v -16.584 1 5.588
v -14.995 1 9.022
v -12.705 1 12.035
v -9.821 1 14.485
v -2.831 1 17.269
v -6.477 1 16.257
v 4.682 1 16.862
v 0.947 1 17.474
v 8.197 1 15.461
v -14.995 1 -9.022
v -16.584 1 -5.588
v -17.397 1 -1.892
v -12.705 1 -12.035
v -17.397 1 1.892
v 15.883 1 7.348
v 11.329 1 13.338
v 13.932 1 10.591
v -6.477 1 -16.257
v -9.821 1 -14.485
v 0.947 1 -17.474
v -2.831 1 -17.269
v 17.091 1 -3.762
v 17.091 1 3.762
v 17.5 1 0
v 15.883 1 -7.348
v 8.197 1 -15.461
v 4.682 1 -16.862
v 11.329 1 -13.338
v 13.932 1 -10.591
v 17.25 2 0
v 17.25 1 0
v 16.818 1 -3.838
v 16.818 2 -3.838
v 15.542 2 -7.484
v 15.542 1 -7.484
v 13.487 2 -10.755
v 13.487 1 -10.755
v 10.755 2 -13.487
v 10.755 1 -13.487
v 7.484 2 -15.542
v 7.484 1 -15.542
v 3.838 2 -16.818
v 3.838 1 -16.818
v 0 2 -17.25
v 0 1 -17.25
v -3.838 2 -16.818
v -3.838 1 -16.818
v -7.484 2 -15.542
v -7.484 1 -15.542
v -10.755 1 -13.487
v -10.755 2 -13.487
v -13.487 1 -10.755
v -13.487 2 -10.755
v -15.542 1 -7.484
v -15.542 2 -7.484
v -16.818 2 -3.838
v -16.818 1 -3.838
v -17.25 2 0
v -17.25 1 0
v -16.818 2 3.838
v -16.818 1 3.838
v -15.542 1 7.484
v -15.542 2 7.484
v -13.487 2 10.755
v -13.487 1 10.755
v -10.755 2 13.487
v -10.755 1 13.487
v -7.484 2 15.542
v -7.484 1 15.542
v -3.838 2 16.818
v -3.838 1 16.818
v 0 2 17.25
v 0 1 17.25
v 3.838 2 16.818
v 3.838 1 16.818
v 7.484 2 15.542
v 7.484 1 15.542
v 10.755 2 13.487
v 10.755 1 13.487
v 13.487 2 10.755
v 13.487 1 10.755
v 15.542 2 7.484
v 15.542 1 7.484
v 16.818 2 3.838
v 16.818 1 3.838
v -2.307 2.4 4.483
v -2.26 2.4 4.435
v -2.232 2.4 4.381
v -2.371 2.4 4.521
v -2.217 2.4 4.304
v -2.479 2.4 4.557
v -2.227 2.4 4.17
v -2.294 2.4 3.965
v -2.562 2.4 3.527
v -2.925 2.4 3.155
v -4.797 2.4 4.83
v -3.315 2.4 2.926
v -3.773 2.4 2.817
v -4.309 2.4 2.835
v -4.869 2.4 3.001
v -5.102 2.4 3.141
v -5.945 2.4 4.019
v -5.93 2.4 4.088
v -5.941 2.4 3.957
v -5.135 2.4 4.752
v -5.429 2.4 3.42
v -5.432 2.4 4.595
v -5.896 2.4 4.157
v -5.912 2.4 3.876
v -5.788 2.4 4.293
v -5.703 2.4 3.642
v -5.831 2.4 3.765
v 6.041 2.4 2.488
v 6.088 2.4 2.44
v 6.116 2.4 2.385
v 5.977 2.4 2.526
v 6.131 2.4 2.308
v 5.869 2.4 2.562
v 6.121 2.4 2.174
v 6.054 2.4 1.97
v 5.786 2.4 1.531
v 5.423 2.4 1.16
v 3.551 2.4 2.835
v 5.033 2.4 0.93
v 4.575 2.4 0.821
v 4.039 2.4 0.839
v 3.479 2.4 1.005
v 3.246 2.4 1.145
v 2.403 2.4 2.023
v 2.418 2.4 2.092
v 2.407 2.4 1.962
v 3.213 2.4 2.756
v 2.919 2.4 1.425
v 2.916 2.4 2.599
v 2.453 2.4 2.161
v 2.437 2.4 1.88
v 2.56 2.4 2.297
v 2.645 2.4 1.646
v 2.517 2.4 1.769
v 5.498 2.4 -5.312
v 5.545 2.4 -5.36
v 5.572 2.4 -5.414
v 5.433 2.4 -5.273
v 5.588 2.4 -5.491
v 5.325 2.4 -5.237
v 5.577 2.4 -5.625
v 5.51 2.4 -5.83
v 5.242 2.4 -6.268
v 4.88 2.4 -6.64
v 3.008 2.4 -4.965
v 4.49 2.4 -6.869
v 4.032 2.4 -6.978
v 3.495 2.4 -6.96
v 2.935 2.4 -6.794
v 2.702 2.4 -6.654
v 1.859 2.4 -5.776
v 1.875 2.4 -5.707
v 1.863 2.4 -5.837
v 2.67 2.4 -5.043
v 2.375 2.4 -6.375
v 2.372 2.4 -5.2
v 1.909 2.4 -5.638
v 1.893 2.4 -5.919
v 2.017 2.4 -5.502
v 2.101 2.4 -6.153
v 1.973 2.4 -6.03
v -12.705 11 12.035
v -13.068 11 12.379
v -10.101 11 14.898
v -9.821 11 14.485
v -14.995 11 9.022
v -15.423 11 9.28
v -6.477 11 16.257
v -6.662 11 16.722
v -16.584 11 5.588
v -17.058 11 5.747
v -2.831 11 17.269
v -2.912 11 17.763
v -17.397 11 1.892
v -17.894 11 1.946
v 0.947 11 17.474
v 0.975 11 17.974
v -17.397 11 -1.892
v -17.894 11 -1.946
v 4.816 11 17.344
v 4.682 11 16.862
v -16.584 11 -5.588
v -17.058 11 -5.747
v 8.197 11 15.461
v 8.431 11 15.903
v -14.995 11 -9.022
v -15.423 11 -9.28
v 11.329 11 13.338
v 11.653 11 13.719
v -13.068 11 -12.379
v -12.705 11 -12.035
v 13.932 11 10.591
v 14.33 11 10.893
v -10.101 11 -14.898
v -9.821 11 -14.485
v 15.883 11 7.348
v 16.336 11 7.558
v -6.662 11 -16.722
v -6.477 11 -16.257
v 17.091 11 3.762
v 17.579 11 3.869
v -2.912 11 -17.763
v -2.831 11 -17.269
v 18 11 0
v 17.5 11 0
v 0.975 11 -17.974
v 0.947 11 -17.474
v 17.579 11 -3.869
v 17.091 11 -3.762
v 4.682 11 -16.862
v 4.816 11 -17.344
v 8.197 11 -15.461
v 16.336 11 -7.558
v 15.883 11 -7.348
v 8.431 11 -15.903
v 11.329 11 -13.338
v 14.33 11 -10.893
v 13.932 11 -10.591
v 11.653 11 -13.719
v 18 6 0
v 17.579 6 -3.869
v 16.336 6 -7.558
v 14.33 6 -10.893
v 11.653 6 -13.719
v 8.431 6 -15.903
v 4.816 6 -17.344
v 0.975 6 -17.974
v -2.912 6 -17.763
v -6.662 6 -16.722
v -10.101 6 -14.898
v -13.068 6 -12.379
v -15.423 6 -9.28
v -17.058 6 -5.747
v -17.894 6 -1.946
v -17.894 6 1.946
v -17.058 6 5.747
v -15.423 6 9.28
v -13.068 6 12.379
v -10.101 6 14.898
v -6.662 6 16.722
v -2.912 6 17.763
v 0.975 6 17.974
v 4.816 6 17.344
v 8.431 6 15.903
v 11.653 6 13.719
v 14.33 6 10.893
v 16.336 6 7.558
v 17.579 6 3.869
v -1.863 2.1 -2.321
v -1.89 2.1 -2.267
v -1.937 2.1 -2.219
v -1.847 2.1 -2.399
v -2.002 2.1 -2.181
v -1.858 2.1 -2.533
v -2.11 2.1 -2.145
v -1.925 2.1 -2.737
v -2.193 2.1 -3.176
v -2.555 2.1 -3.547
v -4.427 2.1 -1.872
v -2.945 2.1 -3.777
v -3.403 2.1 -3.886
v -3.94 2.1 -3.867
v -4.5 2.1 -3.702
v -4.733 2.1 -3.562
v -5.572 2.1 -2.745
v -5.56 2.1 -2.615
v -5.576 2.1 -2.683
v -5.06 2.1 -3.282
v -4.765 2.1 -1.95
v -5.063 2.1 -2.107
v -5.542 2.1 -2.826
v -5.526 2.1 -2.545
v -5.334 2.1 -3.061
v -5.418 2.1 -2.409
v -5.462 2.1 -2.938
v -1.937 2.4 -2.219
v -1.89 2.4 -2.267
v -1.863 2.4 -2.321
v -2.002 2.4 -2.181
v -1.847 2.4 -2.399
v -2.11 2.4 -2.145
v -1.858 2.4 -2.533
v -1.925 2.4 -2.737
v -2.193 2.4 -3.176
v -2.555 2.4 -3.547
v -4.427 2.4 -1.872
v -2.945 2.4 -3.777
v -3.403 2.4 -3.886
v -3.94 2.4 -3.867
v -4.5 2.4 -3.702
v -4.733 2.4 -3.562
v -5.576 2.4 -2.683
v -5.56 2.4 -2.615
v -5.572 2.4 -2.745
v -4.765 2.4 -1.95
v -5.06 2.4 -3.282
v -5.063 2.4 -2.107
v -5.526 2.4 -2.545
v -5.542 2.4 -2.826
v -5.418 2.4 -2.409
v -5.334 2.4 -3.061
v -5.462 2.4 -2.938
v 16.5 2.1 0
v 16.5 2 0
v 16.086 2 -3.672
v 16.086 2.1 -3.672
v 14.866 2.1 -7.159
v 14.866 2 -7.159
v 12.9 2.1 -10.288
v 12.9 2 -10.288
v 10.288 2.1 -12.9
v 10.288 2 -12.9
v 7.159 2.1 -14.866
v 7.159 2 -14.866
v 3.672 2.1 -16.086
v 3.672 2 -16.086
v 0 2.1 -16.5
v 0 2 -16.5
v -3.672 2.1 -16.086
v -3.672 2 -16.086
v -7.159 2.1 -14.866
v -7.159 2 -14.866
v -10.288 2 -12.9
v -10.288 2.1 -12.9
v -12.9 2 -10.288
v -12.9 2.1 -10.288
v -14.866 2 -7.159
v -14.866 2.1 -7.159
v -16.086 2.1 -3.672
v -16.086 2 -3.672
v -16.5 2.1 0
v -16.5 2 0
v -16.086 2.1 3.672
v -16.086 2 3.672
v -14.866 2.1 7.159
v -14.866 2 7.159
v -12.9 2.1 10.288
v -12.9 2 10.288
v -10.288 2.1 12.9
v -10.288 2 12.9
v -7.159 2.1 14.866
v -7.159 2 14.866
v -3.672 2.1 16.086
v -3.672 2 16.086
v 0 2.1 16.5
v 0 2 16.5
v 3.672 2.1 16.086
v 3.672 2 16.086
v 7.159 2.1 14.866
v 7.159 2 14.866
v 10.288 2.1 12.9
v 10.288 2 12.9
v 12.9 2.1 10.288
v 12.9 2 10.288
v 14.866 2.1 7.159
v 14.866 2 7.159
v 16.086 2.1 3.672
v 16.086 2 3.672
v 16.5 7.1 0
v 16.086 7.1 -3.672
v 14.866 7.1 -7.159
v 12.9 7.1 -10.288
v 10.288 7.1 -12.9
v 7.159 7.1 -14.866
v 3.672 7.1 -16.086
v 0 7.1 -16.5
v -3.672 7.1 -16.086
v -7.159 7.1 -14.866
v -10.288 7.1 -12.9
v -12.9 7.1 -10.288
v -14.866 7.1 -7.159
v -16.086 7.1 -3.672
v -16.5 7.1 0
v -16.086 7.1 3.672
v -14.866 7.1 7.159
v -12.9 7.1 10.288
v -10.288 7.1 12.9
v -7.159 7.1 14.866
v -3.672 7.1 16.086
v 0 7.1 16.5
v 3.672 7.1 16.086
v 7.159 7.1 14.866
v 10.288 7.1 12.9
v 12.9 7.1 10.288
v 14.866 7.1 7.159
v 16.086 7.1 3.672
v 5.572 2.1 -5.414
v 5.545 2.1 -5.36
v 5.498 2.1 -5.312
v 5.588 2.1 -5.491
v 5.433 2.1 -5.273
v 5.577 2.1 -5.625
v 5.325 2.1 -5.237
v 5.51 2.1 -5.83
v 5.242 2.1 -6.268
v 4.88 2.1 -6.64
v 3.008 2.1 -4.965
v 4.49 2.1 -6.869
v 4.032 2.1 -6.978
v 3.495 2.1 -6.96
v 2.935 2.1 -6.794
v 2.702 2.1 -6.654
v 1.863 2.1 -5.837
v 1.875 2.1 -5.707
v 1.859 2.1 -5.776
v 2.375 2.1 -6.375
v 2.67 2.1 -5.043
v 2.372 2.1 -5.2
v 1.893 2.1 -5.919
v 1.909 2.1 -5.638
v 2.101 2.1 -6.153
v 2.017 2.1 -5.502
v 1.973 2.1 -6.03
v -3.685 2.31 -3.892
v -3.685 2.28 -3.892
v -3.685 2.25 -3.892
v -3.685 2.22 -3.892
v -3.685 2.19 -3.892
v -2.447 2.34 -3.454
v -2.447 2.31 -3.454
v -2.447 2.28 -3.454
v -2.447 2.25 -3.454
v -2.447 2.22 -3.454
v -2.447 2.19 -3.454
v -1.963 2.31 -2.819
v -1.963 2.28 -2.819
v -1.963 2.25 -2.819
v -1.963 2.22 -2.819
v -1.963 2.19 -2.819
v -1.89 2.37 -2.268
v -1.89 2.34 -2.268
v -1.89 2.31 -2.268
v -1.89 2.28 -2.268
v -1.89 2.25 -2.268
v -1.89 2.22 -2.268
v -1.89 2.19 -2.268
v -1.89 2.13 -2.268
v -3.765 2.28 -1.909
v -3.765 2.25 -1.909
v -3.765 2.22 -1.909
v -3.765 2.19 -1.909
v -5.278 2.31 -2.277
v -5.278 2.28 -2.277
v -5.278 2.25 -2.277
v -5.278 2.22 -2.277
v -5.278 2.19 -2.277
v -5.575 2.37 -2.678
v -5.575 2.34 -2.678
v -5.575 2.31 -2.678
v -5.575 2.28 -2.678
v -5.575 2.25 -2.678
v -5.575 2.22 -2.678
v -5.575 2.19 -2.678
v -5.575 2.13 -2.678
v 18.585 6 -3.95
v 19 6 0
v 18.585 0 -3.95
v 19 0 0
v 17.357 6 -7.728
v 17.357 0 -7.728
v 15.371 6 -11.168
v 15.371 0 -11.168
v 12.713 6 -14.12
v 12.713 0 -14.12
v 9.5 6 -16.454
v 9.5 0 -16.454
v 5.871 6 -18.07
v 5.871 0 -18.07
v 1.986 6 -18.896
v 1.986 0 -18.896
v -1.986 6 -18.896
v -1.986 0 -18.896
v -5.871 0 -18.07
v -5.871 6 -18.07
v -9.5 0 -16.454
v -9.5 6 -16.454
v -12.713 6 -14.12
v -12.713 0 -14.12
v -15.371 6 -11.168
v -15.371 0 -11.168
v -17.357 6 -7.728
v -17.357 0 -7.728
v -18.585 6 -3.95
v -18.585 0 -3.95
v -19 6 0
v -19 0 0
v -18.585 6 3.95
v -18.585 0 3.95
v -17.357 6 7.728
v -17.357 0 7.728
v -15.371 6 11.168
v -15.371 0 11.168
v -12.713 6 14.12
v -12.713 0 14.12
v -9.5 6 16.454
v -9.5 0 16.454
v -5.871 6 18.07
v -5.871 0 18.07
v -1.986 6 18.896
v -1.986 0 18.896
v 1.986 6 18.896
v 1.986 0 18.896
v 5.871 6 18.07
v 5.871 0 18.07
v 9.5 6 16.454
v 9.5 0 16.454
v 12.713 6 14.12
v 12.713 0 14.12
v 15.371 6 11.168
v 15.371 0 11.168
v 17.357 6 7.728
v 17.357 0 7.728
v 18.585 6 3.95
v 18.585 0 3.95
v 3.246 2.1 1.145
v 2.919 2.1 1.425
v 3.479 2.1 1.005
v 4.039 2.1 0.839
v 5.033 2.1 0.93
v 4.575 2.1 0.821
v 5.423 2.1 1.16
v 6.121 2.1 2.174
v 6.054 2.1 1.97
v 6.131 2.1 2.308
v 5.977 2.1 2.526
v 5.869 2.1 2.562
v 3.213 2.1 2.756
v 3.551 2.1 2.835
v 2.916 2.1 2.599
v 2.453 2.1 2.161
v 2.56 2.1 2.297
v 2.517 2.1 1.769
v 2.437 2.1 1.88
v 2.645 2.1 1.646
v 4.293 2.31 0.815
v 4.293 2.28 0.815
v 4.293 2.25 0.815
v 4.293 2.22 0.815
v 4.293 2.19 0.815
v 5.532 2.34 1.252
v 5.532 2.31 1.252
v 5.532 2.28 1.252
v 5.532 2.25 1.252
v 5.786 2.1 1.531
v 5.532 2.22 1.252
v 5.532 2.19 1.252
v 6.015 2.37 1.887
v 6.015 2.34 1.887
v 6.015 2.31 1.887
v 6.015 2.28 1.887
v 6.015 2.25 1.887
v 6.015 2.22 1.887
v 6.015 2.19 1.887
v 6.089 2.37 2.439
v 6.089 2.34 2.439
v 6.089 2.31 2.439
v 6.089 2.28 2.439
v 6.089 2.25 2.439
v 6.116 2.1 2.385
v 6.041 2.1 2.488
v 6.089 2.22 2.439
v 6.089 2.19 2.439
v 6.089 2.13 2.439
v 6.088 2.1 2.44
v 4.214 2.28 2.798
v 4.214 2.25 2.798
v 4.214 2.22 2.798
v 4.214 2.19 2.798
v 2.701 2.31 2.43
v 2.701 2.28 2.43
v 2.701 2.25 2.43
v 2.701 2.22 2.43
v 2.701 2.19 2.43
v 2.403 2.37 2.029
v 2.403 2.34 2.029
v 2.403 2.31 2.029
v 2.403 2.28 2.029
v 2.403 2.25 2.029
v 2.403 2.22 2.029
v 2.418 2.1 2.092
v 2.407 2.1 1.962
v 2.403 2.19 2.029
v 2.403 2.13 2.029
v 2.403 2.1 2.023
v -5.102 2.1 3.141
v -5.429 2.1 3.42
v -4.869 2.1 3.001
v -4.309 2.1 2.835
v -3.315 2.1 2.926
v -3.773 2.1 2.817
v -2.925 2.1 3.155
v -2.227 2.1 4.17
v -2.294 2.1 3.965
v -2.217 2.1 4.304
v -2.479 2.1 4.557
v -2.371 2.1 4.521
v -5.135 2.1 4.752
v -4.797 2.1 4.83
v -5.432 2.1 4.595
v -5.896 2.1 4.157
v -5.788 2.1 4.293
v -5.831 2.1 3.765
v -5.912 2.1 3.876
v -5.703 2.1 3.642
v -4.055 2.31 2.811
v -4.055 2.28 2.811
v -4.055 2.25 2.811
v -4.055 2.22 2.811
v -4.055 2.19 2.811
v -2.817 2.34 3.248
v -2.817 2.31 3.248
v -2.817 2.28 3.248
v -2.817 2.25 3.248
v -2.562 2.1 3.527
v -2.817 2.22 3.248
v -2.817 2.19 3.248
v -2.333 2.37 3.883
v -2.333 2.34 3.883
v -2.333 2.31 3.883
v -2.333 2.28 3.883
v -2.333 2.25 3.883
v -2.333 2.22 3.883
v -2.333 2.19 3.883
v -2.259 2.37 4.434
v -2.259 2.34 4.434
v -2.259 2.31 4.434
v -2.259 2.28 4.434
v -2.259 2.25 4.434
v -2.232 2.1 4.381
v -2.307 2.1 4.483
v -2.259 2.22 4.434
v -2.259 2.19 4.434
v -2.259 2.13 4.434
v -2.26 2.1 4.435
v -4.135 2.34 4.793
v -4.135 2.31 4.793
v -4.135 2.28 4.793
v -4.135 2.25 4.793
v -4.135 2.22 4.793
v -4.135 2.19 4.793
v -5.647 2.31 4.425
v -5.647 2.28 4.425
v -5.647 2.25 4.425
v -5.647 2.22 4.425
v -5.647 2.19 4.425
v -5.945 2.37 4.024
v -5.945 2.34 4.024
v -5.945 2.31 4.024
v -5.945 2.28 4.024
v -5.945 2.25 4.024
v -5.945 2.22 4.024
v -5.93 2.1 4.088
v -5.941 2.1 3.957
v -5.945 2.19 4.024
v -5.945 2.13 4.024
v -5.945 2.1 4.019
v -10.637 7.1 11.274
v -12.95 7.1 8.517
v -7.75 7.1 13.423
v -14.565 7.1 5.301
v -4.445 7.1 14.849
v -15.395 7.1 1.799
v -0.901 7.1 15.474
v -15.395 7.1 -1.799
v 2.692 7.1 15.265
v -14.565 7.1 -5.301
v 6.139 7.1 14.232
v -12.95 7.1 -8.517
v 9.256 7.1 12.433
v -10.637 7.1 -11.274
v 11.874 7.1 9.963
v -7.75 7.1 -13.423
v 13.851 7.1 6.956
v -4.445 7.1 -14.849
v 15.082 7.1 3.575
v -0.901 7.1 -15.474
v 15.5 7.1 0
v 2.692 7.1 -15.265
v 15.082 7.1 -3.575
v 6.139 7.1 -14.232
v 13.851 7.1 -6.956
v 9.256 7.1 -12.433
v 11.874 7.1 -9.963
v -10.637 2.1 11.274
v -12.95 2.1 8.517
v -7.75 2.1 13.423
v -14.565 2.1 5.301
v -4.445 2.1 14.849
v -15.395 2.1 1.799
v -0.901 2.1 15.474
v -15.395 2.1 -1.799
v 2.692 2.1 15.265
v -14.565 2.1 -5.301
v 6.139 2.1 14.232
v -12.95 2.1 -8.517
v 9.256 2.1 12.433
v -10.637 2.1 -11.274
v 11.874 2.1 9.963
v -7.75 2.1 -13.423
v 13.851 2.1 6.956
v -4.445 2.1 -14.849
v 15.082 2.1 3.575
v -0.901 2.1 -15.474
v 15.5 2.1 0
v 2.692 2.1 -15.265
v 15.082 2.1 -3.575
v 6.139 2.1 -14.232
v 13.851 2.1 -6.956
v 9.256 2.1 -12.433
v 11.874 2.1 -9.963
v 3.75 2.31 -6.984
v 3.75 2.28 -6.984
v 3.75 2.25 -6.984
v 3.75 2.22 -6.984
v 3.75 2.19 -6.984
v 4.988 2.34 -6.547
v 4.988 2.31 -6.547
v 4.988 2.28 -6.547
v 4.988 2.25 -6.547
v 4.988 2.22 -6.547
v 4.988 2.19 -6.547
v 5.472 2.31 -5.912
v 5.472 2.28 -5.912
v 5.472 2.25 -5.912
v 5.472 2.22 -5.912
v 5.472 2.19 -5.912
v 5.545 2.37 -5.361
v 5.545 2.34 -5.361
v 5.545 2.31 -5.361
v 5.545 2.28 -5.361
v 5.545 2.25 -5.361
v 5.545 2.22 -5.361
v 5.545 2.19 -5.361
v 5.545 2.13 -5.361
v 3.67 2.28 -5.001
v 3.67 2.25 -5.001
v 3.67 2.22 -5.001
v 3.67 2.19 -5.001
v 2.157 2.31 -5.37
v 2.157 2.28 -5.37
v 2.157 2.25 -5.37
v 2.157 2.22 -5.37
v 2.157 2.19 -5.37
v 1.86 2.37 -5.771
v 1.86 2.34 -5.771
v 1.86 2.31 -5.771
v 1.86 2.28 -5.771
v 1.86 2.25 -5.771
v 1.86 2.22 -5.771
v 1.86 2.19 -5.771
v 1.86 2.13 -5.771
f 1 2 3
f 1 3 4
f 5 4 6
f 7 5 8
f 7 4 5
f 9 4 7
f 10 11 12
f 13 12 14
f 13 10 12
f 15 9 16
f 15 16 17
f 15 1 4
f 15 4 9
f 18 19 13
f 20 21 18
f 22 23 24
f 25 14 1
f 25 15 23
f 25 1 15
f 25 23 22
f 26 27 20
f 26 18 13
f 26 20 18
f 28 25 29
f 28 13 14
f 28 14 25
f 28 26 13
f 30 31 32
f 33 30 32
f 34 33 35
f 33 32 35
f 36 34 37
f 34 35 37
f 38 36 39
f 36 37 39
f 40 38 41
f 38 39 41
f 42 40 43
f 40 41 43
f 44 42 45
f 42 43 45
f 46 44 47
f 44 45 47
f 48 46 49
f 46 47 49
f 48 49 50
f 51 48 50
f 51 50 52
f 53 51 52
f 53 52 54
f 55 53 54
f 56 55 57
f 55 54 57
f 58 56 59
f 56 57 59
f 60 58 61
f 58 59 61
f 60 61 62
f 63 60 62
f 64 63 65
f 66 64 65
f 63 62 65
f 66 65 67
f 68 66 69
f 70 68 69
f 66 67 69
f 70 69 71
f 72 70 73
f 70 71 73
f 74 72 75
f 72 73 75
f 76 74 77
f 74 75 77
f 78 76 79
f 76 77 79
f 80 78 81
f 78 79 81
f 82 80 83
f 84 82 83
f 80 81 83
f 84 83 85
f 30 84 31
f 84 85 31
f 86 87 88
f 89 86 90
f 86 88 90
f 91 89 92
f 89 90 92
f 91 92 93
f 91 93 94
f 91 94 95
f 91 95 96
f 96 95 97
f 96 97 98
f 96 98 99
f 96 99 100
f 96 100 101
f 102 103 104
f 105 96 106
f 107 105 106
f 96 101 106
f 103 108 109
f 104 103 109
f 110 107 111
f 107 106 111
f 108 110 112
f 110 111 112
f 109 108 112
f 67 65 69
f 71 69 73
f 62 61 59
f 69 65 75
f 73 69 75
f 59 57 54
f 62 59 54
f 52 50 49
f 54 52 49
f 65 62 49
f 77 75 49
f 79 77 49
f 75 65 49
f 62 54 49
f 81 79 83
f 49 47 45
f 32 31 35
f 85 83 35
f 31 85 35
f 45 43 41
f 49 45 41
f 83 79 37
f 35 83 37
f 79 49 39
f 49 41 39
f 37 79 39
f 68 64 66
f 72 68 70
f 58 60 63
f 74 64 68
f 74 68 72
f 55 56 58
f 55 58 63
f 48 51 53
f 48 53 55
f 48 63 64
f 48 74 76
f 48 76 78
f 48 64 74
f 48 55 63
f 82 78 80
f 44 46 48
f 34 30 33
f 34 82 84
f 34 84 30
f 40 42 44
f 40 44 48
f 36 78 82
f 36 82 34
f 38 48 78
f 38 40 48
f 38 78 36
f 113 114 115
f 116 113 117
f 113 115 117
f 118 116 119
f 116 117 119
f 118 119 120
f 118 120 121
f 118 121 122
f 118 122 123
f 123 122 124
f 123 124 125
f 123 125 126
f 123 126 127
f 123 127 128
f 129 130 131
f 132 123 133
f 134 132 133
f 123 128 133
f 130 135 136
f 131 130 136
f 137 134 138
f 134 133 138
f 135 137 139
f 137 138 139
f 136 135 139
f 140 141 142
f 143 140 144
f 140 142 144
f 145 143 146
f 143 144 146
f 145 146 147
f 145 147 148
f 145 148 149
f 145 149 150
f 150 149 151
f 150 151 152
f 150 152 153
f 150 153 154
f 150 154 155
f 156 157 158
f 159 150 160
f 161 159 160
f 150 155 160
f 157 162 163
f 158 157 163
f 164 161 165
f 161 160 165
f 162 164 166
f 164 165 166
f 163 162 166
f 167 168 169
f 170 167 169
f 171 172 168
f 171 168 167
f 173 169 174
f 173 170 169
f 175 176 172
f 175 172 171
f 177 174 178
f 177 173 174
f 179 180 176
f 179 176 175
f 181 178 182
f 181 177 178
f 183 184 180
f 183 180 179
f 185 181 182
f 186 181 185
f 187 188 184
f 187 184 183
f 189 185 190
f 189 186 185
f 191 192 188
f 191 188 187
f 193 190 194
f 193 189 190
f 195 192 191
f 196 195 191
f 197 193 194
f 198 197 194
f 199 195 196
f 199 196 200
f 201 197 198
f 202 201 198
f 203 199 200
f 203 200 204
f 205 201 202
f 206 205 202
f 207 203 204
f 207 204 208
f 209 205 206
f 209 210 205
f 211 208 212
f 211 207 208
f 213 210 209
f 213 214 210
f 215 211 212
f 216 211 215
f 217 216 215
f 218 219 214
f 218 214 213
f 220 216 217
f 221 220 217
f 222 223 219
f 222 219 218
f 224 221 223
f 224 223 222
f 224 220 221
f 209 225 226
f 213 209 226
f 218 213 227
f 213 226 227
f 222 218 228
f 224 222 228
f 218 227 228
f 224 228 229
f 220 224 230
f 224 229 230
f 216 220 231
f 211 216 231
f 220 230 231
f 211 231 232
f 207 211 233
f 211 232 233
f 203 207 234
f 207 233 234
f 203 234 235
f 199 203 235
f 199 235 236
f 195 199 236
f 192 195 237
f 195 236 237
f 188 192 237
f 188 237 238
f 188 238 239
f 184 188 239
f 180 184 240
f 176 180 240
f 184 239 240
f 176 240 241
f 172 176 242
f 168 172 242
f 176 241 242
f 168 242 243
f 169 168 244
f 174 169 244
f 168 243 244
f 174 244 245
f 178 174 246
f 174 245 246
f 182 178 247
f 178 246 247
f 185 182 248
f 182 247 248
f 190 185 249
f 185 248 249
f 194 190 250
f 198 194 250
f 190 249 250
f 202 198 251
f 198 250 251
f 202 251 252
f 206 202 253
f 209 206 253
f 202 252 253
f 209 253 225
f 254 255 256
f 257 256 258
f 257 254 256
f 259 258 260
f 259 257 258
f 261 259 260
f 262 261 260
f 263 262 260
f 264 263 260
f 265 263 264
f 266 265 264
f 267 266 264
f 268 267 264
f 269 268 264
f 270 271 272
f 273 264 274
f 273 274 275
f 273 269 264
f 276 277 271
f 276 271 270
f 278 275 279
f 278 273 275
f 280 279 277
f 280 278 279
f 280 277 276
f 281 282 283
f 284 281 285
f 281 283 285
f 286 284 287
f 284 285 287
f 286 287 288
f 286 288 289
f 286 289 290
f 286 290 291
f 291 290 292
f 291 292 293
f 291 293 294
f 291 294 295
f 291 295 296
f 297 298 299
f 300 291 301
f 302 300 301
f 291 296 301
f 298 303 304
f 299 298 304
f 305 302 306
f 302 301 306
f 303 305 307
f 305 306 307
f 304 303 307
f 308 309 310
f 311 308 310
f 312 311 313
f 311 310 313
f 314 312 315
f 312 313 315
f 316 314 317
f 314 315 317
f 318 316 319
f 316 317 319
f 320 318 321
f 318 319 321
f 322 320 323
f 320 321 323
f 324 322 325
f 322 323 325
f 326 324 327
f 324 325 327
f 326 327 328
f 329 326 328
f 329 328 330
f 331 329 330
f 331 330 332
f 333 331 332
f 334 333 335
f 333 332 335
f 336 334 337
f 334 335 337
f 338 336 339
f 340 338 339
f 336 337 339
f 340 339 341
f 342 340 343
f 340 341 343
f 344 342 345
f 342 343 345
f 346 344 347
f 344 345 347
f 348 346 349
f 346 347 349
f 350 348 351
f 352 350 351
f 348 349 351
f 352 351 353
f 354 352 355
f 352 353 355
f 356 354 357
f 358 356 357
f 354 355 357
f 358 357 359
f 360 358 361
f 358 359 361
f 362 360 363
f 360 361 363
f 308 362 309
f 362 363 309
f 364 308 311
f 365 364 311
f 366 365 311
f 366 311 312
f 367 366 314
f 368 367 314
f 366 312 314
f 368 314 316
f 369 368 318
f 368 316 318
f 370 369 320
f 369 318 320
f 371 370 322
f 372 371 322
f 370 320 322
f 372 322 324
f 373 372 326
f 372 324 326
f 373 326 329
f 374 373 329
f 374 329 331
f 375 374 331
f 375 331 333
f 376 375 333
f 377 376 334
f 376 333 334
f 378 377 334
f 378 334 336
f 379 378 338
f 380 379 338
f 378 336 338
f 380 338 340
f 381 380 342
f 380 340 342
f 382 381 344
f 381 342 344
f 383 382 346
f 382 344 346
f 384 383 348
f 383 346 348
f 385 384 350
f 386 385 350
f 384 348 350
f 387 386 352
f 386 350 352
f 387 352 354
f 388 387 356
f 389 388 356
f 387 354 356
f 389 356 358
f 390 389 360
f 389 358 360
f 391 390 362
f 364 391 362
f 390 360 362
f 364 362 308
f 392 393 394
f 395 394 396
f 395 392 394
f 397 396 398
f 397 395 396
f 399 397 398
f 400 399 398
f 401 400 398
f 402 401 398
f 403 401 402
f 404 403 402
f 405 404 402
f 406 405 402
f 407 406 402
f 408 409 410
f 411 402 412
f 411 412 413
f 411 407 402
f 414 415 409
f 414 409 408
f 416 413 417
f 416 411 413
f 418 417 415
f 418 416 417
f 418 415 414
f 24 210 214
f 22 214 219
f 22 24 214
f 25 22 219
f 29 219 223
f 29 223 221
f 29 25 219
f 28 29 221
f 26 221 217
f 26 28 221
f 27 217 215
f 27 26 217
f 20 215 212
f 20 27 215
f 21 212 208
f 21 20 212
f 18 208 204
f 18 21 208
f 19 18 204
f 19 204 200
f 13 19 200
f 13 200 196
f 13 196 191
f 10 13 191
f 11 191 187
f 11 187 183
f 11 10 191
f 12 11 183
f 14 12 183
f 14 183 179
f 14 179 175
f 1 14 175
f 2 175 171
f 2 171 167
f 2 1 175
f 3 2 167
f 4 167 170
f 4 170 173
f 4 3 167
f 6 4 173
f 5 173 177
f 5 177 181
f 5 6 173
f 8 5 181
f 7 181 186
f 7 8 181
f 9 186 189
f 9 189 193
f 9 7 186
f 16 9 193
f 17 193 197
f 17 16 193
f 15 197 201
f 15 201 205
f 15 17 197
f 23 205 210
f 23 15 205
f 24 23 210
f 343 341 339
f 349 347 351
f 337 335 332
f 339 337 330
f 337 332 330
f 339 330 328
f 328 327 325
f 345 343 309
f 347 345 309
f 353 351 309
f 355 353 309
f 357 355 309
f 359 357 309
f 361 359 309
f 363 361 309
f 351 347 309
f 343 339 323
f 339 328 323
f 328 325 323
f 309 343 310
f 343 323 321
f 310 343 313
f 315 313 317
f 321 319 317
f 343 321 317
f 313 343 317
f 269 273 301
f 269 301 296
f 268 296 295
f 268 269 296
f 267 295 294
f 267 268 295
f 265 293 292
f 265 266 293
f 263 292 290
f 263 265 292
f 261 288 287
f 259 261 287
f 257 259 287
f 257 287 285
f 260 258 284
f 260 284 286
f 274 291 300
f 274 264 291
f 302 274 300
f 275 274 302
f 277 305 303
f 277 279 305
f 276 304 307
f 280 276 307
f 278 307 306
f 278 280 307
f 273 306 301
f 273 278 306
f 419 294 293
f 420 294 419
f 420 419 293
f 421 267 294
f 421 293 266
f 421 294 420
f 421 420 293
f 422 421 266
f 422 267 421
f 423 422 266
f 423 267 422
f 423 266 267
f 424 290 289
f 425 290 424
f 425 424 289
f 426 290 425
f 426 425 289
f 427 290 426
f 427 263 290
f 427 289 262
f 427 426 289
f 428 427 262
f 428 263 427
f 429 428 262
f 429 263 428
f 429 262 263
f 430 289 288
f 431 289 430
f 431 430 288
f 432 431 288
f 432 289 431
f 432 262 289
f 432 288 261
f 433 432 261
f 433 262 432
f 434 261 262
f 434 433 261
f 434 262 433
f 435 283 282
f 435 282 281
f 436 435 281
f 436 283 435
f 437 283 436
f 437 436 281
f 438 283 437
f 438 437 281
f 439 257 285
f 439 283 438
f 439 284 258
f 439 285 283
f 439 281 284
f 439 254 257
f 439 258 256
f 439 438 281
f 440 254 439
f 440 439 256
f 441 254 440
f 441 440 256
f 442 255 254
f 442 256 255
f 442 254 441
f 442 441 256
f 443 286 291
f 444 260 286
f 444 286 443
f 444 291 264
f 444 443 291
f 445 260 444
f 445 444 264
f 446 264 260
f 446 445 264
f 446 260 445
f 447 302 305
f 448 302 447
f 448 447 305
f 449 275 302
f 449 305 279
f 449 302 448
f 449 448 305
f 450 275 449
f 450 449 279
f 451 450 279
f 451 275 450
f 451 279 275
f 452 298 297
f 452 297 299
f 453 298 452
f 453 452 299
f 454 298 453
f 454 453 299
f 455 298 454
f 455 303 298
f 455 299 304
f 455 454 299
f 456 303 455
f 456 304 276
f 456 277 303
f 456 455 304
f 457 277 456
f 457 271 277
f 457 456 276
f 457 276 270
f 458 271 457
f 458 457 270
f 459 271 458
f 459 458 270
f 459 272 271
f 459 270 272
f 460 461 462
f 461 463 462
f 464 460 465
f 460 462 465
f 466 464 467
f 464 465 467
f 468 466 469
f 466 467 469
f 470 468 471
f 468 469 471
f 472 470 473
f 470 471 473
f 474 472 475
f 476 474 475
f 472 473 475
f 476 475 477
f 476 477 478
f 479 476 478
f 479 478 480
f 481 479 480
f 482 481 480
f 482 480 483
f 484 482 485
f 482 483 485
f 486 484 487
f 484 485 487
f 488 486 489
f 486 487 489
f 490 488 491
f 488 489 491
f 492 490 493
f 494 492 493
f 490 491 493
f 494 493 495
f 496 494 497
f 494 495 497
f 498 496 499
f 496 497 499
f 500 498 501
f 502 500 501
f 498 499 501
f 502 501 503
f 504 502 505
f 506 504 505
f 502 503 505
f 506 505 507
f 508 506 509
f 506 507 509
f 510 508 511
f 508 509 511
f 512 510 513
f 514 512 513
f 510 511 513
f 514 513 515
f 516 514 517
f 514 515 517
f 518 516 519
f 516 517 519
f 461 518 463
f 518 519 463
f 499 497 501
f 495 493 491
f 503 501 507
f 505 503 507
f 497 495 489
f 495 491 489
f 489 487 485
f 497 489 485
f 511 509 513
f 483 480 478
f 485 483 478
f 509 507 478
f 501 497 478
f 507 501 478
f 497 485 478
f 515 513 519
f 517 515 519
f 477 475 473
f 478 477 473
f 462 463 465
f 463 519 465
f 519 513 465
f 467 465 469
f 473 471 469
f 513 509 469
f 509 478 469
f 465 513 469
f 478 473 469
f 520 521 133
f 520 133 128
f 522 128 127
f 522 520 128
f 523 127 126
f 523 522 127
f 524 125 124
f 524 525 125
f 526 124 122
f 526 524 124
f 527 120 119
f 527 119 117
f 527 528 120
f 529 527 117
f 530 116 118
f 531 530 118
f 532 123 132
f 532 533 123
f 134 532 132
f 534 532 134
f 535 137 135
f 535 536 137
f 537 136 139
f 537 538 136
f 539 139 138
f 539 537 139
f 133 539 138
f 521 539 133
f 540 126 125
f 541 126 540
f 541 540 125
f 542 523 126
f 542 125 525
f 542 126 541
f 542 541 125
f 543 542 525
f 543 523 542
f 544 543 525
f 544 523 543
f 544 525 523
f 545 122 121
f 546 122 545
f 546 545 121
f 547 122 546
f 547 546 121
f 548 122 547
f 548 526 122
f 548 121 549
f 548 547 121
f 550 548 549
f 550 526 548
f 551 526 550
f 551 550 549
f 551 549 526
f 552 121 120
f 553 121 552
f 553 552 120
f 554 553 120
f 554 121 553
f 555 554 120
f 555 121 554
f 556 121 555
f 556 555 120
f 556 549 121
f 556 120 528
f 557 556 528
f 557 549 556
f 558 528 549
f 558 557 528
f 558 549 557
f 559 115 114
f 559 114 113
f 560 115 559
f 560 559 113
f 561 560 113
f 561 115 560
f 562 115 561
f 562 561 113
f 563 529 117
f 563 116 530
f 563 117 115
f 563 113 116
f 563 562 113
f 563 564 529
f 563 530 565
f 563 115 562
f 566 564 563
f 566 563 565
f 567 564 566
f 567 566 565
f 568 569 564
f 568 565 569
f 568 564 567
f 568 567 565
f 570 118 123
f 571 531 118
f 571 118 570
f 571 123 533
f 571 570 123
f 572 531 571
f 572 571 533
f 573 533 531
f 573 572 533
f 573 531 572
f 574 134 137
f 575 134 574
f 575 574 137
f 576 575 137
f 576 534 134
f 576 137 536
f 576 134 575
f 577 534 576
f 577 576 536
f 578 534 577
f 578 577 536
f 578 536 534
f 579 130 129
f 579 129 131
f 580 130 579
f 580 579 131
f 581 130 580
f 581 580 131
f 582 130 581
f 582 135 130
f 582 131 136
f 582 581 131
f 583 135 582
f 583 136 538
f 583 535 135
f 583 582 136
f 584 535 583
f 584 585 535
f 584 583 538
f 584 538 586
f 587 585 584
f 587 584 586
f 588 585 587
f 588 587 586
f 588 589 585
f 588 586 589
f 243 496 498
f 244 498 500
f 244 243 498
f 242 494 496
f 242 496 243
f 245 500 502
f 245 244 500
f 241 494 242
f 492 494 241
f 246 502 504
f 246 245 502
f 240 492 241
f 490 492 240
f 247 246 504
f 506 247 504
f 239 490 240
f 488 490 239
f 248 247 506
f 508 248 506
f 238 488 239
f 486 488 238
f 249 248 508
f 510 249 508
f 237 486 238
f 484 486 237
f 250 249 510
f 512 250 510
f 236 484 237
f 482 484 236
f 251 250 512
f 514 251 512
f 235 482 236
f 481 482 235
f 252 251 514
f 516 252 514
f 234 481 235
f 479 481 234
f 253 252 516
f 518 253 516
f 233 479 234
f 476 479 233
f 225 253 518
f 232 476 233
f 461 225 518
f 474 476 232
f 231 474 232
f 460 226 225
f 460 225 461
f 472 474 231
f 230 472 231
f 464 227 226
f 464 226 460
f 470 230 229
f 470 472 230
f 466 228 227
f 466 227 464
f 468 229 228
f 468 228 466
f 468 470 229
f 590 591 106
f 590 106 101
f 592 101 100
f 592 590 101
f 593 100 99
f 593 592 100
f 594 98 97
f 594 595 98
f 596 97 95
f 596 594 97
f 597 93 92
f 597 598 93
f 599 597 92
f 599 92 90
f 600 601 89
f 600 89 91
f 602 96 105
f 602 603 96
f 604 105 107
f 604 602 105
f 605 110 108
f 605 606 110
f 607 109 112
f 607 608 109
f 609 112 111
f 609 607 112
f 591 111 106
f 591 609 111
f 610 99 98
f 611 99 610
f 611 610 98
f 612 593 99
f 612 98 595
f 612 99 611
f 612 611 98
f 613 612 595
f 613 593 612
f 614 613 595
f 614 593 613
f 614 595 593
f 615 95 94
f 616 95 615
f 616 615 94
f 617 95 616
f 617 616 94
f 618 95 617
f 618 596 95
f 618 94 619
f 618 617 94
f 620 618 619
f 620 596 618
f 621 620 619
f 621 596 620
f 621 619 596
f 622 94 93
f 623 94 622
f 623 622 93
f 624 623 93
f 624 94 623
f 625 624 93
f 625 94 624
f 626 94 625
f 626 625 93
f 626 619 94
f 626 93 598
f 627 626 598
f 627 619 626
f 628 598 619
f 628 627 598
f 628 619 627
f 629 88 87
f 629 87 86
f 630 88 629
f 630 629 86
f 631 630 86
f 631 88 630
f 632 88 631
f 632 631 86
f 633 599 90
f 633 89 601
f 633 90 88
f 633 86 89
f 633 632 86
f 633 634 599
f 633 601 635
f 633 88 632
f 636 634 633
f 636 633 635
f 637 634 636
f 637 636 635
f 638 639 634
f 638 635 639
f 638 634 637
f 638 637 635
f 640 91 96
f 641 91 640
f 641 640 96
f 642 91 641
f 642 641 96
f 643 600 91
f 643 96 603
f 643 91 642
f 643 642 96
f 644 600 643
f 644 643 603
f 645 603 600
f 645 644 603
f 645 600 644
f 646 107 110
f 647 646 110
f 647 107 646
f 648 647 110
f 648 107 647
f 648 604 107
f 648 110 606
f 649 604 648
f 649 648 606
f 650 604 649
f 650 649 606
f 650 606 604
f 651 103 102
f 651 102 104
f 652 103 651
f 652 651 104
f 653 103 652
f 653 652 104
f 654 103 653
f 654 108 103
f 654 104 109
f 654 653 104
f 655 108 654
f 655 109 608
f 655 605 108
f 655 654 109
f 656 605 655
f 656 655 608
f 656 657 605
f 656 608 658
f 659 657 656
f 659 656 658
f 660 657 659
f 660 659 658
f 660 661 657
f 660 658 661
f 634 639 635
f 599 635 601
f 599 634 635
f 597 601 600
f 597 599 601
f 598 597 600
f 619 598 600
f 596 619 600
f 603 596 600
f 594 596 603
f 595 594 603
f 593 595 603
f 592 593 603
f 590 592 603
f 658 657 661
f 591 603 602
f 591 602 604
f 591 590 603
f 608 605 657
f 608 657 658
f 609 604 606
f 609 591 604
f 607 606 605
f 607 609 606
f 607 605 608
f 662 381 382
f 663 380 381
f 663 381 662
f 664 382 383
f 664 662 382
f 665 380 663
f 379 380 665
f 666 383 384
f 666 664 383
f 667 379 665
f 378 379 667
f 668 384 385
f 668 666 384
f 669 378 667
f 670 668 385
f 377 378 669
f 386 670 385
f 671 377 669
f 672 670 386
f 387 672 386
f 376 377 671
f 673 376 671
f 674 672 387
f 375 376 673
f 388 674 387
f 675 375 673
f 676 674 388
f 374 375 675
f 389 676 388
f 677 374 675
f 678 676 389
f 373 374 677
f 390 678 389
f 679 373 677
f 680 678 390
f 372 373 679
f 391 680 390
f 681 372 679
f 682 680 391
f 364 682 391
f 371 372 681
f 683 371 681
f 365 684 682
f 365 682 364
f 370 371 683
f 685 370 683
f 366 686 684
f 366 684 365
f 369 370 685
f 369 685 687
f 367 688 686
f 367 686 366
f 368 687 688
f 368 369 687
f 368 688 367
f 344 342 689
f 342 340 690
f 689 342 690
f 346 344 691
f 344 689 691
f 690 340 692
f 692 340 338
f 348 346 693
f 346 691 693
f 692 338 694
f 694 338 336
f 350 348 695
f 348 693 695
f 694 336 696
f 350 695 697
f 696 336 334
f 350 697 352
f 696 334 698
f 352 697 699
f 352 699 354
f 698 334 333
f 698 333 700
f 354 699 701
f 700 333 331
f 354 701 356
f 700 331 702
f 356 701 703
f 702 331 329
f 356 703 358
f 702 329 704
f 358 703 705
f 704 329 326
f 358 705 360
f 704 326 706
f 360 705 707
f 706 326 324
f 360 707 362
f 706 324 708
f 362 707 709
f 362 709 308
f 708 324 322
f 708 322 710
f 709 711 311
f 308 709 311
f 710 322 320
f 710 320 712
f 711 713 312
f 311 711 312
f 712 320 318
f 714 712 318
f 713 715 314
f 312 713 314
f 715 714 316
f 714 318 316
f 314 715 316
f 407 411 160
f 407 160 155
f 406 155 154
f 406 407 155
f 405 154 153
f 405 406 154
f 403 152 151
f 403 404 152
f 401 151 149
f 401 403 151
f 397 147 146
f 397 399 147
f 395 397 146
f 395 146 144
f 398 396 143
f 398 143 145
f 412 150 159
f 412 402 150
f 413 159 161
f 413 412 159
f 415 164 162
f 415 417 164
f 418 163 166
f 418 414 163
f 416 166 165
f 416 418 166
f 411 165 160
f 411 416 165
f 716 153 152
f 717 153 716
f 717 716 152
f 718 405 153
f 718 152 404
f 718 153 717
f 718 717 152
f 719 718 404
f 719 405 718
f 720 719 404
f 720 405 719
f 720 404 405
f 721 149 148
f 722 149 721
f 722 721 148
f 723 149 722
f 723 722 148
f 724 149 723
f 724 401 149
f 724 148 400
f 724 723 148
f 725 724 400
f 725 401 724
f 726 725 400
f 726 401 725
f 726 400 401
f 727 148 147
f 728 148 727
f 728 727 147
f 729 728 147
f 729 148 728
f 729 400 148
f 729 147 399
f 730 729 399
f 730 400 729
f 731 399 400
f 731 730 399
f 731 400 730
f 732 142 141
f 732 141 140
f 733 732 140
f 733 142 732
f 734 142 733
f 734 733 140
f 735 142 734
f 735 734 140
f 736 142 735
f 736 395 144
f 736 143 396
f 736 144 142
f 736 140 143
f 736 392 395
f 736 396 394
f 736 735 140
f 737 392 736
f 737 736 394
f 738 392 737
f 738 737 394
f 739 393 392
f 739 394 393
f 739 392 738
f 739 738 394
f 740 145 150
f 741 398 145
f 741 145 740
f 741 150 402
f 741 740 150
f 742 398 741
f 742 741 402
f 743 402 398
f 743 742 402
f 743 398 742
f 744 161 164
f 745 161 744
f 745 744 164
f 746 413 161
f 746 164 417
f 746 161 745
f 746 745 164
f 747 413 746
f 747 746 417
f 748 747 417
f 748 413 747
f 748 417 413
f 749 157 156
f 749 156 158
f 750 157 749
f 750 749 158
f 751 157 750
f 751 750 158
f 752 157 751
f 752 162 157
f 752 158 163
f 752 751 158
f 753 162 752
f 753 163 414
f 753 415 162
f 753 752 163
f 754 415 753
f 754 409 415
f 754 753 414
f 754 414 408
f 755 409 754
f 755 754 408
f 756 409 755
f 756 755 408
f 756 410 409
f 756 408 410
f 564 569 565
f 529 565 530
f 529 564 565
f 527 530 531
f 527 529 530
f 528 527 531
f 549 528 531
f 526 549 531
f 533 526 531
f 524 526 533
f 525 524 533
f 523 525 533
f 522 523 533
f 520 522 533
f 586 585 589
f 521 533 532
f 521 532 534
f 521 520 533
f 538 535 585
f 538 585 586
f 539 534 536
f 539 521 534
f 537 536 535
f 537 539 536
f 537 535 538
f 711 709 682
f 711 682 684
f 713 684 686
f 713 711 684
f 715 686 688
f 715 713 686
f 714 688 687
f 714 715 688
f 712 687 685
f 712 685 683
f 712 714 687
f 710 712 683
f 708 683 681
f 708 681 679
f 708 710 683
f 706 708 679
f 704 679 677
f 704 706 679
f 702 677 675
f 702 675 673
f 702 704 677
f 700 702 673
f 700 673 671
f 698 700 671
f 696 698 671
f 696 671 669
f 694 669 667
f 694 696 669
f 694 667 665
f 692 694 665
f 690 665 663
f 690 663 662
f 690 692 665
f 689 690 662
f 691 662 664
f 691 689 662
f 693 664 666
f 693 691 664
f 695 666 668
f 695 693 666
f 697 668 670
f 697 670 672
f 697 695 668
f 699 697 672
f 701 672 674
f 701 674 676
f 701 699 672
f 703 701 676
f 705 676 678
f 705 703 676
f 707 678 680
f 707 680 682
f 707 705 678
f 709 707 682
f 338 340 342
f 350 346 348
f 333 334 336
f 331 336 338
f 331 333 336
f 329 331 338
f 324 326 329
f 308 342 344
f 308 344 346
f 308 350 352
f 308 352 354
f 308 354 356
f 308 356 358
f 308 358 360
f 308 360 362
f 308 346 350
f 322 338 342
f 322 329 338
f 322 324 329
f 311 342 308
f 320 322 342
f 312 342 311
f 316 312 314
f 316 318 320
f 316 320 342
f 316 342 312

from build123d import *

# Parameters (mm, degrees)
SKETCH1_R           = 19
BOSS_EXTRUDE1_DEPTH = 1
SKETCH2_R           = 19
SKETCH2_R_2         = 17.5
BOSS_EXTRUDE2_DEPTH = 5
SKETCH3_R           = 18
SKETCH3_R_2         = 17.5
BOSS_EXTRUDE3_DEPTH = 5
SKETCH4_R           = 16.5
MEMBRANE_DEPTH      = 0.1
SKETCH5_R           = 16.5
SKETCH5_R_2         = 15.5
BOSS_EXTRUDE5_DEPTH = 5
SLICES_DEPTH        = 0.3
SLICES_2_DEPTH      = 0.3
SLICES_3_DEPTH      = 0.3
SLICES_4_DEPTH      = 0.3
SKETCH7_R           = 17.25
BOSS_EXTRUDE7_DEPTH = 1


with BuildPart() as part:
    # Sketch1 → Boss-Extrude1 (new body)
    with BuildSketch(Plane(origin=(0, 0, 0), x_dir=(1, 0, 0), z_dir=(0, 1, 0))):
        Circle(SKETCH1_R)
    extrude(amount=BOSS_EXTRUDE1_DEPTH)

    # Sketch2 → Boss-Extrude2 (add)
    with BuildSketch(Plane(origin=(0, 1, 0), x_dir=(1, 0, 0), z_dir=(0, 1, 0))):
        Circle(SKETCH2_R)
        Circle(SKETCH2_R_2, mode=Mode.SUBTRACT)
    extrude(amount=BOSS_EXTRUDE2_DEPTH)

    # Sketch3 → Boss-Extrude3 (add)
    with BuildSketch(Plane(origin=(0, 6, 0), x_dir=(1, 0, 0), z_dir=(0, 1, 0))):
        Circle(SKETCH3_R)
        Circle(SKETCH3_R_2, mode=Mode.SUBTRACT)
    extrude(amount=BOSS_EXTRUDE3_DEPTH)


with BuildPart() as body_2:
    # Sketch4 → membrane (new body)
    with BuildSketch(Plane(origin=(0, 2, 0), x_dir=(1, 0, 0), z_dir=(0, 1, 0))):
        Circle(SKETCH4_R)
    extrude(amount=MEMBRANE_DEPTH)


with BuildPart() as body_3:
    # Sketch5 → Boss-Extrude5 (new body)
    with BuildSketch(Plane(origin=(0, 2.1, 0), x_dir=(1, 0, 0), z_dir=(0, 1, 0))):
        Circle(SKETCH5_R)
        Circle(SKETCH5_R_2, mode=Mode.SUBTRACT)
    extrude(amount=BOSS_EXTRUDE5_DEPTH)


with BuildPart() as body_4:
    # Sketch6 → slices (new body)
    with BuildSketch(Plane(origin=(0, 2.1, 0), x_dir=(1, 0, 0), z_dir=(0, 1, 0))):
        with BuildLine():
            add(Edge.make_bspline(
                [(-5.429042639, -3.420339657), (-5.297041768, -3.310830686), (-4.961993019, -2.965303225), (-3.945831341, -2.706421687), (-2.783569857, -3.001085011), (-1.764073176, -4.761079251), (-3.371477913, -4.51450635), (-4.218115468, -4.870930058), (-5.074604653, -4.861818086), (-5.619785113, -4.468520181), (-6.162976614, -3.931834745), (-5.654129434, -3.60707345), (-5.429042639, -3.420339657)],
                knots=[0, 0, 0, 0, 0.051934961, 0.170653906, 0.317123498, 0.463290568, 0.601985486, 0.67644339, 0.792471652, 0.855761907, 0.911440933, 1, 1, 1, 1], degree=3))
        make_face()
    extrude(amount=SLICES_DEPTH)


with BuildPart() as body_5:
    # Sketch6 → slices 2 (new body)
    with BuildSketch(Plane(origin=(0, 2.1, 0), x_dir=(1, 0, 0), z_dir=(0, 1, 0))):
        with BuildLine():
            add(Edge.make_bspline(
                [(-5.059501001, 3.281861232), (-4.92750013, 3.391370203), (-4.592451381, 3.736897664), (-3.576289703, 3.995779201), (-2.414028219, 3.701115877), (-1.394531538, 1.941121638), (-3.001936275, 2.187694539), (-3.84857383, 1.83127083), (-4.705063014, 1.840382802), (-5.250243475, 2.233680708), (-5.793434976, 2.770366144), (-5.284587796, 3.095127439), (-5.059501001, 3.281861232)],
                knots=[0, 0, 0, 0, 0.051934961, 0.170653906, 0.317123498, 0.463290568, 0.601985486, 0.67644339, 0.792471652, 0.855761907, 0.911440933, 1, 1, 1, 1], degree=3))
        make_face()
    extrude(amount=SLICES_2_DEPTH)


with BuildPart() as body_6:
    # Sketch6 → slices 3 (new body)
    with BuildSketch(Plane(origin=(0, 2.1, 0), x_dir=(1, 0, 0), z_dir=(0, 1, 0))):
        with BuildLine():
            add(Edge.make_bspline(
                [(2.375498422, 6.374521352), (2.507499294, 6.484030323), (2.842548043, 6.829557784), (3.85870972, 7.088439322), (5.020971205, 6.793775998), (6.040467885, 5.033781758), (4.433063148, 5.280354659), (3.586425594, 4.923930951), (2.729936409, 4.933042923), (2.184755949, 5.326340828), (1.641564448, 5.863026264), (2.150411627, 6.187787559), (2.375498422, 6.374521352)],
                knots=[0, 0, 0, 0, 0.051934961, 0.170653906, 0.317123498, 0.463290568, 0.601985486, 0.67644339, 0.792471652, 0.855761907, 0.911440933, 1, 1, 1, 1], degree=3))
        make_face()
    extrude(amount=SLICES_3_DEPTH)


with BuildPart() as body_7:
    # Sketch6 → slices 4 (new body)
    with BuildSketch(Plane(origin=(0, 2.1, 0), x_dir=(1, 0, 0), z_dir=(0, 1, 0))):
        with BuildLine():
            add(Edge.make_bspline(
                [(2.919072984, -1.424813087), (3.051073856, -1.315304116), (3.386122605, -0.969776655), (4.402284282, -0.710895118), (5.564545767, -1.005558442), (6.584042447, -2.765552681), (4.97663771, -2.51897978), (4.130000156, -2.875403489), (3.273510971, -2.866291517), (2.728330511, -2.472993611), (2.18513901, -1.936308175), (2.693986189, -1.61154688), (2.919072984, -1.424813087)],
                knots=[0, 0, 0, 0, 0.051934961, 0.170653906, 0.317123498, 0.463290568, 0.601985486, 0.67644339, 0.792471652, 0.855761907, 0.911440933, 1, 1, 1, 1], degree=3))
        make_face()
    extrude(amount=SLICES_4_DEPTH)


with BuildPart() as body_8:
    # Sketch7 → Boss-Extrude7 (new body)
    with BuildSketch(Plane(origin=(0, 1, 0), x_dir=(1, 0, 0), z_dir=(0, 1, 0))):
        Circle(SKETCH7_R)
    extrude(amount=BOSS_EXTRUDE7_DEPTH)


solid = Compound([part.part, body_2.part, body_3.part, body_4.part, body_5.part, body_6.part, body_7.part, body_8.part])
